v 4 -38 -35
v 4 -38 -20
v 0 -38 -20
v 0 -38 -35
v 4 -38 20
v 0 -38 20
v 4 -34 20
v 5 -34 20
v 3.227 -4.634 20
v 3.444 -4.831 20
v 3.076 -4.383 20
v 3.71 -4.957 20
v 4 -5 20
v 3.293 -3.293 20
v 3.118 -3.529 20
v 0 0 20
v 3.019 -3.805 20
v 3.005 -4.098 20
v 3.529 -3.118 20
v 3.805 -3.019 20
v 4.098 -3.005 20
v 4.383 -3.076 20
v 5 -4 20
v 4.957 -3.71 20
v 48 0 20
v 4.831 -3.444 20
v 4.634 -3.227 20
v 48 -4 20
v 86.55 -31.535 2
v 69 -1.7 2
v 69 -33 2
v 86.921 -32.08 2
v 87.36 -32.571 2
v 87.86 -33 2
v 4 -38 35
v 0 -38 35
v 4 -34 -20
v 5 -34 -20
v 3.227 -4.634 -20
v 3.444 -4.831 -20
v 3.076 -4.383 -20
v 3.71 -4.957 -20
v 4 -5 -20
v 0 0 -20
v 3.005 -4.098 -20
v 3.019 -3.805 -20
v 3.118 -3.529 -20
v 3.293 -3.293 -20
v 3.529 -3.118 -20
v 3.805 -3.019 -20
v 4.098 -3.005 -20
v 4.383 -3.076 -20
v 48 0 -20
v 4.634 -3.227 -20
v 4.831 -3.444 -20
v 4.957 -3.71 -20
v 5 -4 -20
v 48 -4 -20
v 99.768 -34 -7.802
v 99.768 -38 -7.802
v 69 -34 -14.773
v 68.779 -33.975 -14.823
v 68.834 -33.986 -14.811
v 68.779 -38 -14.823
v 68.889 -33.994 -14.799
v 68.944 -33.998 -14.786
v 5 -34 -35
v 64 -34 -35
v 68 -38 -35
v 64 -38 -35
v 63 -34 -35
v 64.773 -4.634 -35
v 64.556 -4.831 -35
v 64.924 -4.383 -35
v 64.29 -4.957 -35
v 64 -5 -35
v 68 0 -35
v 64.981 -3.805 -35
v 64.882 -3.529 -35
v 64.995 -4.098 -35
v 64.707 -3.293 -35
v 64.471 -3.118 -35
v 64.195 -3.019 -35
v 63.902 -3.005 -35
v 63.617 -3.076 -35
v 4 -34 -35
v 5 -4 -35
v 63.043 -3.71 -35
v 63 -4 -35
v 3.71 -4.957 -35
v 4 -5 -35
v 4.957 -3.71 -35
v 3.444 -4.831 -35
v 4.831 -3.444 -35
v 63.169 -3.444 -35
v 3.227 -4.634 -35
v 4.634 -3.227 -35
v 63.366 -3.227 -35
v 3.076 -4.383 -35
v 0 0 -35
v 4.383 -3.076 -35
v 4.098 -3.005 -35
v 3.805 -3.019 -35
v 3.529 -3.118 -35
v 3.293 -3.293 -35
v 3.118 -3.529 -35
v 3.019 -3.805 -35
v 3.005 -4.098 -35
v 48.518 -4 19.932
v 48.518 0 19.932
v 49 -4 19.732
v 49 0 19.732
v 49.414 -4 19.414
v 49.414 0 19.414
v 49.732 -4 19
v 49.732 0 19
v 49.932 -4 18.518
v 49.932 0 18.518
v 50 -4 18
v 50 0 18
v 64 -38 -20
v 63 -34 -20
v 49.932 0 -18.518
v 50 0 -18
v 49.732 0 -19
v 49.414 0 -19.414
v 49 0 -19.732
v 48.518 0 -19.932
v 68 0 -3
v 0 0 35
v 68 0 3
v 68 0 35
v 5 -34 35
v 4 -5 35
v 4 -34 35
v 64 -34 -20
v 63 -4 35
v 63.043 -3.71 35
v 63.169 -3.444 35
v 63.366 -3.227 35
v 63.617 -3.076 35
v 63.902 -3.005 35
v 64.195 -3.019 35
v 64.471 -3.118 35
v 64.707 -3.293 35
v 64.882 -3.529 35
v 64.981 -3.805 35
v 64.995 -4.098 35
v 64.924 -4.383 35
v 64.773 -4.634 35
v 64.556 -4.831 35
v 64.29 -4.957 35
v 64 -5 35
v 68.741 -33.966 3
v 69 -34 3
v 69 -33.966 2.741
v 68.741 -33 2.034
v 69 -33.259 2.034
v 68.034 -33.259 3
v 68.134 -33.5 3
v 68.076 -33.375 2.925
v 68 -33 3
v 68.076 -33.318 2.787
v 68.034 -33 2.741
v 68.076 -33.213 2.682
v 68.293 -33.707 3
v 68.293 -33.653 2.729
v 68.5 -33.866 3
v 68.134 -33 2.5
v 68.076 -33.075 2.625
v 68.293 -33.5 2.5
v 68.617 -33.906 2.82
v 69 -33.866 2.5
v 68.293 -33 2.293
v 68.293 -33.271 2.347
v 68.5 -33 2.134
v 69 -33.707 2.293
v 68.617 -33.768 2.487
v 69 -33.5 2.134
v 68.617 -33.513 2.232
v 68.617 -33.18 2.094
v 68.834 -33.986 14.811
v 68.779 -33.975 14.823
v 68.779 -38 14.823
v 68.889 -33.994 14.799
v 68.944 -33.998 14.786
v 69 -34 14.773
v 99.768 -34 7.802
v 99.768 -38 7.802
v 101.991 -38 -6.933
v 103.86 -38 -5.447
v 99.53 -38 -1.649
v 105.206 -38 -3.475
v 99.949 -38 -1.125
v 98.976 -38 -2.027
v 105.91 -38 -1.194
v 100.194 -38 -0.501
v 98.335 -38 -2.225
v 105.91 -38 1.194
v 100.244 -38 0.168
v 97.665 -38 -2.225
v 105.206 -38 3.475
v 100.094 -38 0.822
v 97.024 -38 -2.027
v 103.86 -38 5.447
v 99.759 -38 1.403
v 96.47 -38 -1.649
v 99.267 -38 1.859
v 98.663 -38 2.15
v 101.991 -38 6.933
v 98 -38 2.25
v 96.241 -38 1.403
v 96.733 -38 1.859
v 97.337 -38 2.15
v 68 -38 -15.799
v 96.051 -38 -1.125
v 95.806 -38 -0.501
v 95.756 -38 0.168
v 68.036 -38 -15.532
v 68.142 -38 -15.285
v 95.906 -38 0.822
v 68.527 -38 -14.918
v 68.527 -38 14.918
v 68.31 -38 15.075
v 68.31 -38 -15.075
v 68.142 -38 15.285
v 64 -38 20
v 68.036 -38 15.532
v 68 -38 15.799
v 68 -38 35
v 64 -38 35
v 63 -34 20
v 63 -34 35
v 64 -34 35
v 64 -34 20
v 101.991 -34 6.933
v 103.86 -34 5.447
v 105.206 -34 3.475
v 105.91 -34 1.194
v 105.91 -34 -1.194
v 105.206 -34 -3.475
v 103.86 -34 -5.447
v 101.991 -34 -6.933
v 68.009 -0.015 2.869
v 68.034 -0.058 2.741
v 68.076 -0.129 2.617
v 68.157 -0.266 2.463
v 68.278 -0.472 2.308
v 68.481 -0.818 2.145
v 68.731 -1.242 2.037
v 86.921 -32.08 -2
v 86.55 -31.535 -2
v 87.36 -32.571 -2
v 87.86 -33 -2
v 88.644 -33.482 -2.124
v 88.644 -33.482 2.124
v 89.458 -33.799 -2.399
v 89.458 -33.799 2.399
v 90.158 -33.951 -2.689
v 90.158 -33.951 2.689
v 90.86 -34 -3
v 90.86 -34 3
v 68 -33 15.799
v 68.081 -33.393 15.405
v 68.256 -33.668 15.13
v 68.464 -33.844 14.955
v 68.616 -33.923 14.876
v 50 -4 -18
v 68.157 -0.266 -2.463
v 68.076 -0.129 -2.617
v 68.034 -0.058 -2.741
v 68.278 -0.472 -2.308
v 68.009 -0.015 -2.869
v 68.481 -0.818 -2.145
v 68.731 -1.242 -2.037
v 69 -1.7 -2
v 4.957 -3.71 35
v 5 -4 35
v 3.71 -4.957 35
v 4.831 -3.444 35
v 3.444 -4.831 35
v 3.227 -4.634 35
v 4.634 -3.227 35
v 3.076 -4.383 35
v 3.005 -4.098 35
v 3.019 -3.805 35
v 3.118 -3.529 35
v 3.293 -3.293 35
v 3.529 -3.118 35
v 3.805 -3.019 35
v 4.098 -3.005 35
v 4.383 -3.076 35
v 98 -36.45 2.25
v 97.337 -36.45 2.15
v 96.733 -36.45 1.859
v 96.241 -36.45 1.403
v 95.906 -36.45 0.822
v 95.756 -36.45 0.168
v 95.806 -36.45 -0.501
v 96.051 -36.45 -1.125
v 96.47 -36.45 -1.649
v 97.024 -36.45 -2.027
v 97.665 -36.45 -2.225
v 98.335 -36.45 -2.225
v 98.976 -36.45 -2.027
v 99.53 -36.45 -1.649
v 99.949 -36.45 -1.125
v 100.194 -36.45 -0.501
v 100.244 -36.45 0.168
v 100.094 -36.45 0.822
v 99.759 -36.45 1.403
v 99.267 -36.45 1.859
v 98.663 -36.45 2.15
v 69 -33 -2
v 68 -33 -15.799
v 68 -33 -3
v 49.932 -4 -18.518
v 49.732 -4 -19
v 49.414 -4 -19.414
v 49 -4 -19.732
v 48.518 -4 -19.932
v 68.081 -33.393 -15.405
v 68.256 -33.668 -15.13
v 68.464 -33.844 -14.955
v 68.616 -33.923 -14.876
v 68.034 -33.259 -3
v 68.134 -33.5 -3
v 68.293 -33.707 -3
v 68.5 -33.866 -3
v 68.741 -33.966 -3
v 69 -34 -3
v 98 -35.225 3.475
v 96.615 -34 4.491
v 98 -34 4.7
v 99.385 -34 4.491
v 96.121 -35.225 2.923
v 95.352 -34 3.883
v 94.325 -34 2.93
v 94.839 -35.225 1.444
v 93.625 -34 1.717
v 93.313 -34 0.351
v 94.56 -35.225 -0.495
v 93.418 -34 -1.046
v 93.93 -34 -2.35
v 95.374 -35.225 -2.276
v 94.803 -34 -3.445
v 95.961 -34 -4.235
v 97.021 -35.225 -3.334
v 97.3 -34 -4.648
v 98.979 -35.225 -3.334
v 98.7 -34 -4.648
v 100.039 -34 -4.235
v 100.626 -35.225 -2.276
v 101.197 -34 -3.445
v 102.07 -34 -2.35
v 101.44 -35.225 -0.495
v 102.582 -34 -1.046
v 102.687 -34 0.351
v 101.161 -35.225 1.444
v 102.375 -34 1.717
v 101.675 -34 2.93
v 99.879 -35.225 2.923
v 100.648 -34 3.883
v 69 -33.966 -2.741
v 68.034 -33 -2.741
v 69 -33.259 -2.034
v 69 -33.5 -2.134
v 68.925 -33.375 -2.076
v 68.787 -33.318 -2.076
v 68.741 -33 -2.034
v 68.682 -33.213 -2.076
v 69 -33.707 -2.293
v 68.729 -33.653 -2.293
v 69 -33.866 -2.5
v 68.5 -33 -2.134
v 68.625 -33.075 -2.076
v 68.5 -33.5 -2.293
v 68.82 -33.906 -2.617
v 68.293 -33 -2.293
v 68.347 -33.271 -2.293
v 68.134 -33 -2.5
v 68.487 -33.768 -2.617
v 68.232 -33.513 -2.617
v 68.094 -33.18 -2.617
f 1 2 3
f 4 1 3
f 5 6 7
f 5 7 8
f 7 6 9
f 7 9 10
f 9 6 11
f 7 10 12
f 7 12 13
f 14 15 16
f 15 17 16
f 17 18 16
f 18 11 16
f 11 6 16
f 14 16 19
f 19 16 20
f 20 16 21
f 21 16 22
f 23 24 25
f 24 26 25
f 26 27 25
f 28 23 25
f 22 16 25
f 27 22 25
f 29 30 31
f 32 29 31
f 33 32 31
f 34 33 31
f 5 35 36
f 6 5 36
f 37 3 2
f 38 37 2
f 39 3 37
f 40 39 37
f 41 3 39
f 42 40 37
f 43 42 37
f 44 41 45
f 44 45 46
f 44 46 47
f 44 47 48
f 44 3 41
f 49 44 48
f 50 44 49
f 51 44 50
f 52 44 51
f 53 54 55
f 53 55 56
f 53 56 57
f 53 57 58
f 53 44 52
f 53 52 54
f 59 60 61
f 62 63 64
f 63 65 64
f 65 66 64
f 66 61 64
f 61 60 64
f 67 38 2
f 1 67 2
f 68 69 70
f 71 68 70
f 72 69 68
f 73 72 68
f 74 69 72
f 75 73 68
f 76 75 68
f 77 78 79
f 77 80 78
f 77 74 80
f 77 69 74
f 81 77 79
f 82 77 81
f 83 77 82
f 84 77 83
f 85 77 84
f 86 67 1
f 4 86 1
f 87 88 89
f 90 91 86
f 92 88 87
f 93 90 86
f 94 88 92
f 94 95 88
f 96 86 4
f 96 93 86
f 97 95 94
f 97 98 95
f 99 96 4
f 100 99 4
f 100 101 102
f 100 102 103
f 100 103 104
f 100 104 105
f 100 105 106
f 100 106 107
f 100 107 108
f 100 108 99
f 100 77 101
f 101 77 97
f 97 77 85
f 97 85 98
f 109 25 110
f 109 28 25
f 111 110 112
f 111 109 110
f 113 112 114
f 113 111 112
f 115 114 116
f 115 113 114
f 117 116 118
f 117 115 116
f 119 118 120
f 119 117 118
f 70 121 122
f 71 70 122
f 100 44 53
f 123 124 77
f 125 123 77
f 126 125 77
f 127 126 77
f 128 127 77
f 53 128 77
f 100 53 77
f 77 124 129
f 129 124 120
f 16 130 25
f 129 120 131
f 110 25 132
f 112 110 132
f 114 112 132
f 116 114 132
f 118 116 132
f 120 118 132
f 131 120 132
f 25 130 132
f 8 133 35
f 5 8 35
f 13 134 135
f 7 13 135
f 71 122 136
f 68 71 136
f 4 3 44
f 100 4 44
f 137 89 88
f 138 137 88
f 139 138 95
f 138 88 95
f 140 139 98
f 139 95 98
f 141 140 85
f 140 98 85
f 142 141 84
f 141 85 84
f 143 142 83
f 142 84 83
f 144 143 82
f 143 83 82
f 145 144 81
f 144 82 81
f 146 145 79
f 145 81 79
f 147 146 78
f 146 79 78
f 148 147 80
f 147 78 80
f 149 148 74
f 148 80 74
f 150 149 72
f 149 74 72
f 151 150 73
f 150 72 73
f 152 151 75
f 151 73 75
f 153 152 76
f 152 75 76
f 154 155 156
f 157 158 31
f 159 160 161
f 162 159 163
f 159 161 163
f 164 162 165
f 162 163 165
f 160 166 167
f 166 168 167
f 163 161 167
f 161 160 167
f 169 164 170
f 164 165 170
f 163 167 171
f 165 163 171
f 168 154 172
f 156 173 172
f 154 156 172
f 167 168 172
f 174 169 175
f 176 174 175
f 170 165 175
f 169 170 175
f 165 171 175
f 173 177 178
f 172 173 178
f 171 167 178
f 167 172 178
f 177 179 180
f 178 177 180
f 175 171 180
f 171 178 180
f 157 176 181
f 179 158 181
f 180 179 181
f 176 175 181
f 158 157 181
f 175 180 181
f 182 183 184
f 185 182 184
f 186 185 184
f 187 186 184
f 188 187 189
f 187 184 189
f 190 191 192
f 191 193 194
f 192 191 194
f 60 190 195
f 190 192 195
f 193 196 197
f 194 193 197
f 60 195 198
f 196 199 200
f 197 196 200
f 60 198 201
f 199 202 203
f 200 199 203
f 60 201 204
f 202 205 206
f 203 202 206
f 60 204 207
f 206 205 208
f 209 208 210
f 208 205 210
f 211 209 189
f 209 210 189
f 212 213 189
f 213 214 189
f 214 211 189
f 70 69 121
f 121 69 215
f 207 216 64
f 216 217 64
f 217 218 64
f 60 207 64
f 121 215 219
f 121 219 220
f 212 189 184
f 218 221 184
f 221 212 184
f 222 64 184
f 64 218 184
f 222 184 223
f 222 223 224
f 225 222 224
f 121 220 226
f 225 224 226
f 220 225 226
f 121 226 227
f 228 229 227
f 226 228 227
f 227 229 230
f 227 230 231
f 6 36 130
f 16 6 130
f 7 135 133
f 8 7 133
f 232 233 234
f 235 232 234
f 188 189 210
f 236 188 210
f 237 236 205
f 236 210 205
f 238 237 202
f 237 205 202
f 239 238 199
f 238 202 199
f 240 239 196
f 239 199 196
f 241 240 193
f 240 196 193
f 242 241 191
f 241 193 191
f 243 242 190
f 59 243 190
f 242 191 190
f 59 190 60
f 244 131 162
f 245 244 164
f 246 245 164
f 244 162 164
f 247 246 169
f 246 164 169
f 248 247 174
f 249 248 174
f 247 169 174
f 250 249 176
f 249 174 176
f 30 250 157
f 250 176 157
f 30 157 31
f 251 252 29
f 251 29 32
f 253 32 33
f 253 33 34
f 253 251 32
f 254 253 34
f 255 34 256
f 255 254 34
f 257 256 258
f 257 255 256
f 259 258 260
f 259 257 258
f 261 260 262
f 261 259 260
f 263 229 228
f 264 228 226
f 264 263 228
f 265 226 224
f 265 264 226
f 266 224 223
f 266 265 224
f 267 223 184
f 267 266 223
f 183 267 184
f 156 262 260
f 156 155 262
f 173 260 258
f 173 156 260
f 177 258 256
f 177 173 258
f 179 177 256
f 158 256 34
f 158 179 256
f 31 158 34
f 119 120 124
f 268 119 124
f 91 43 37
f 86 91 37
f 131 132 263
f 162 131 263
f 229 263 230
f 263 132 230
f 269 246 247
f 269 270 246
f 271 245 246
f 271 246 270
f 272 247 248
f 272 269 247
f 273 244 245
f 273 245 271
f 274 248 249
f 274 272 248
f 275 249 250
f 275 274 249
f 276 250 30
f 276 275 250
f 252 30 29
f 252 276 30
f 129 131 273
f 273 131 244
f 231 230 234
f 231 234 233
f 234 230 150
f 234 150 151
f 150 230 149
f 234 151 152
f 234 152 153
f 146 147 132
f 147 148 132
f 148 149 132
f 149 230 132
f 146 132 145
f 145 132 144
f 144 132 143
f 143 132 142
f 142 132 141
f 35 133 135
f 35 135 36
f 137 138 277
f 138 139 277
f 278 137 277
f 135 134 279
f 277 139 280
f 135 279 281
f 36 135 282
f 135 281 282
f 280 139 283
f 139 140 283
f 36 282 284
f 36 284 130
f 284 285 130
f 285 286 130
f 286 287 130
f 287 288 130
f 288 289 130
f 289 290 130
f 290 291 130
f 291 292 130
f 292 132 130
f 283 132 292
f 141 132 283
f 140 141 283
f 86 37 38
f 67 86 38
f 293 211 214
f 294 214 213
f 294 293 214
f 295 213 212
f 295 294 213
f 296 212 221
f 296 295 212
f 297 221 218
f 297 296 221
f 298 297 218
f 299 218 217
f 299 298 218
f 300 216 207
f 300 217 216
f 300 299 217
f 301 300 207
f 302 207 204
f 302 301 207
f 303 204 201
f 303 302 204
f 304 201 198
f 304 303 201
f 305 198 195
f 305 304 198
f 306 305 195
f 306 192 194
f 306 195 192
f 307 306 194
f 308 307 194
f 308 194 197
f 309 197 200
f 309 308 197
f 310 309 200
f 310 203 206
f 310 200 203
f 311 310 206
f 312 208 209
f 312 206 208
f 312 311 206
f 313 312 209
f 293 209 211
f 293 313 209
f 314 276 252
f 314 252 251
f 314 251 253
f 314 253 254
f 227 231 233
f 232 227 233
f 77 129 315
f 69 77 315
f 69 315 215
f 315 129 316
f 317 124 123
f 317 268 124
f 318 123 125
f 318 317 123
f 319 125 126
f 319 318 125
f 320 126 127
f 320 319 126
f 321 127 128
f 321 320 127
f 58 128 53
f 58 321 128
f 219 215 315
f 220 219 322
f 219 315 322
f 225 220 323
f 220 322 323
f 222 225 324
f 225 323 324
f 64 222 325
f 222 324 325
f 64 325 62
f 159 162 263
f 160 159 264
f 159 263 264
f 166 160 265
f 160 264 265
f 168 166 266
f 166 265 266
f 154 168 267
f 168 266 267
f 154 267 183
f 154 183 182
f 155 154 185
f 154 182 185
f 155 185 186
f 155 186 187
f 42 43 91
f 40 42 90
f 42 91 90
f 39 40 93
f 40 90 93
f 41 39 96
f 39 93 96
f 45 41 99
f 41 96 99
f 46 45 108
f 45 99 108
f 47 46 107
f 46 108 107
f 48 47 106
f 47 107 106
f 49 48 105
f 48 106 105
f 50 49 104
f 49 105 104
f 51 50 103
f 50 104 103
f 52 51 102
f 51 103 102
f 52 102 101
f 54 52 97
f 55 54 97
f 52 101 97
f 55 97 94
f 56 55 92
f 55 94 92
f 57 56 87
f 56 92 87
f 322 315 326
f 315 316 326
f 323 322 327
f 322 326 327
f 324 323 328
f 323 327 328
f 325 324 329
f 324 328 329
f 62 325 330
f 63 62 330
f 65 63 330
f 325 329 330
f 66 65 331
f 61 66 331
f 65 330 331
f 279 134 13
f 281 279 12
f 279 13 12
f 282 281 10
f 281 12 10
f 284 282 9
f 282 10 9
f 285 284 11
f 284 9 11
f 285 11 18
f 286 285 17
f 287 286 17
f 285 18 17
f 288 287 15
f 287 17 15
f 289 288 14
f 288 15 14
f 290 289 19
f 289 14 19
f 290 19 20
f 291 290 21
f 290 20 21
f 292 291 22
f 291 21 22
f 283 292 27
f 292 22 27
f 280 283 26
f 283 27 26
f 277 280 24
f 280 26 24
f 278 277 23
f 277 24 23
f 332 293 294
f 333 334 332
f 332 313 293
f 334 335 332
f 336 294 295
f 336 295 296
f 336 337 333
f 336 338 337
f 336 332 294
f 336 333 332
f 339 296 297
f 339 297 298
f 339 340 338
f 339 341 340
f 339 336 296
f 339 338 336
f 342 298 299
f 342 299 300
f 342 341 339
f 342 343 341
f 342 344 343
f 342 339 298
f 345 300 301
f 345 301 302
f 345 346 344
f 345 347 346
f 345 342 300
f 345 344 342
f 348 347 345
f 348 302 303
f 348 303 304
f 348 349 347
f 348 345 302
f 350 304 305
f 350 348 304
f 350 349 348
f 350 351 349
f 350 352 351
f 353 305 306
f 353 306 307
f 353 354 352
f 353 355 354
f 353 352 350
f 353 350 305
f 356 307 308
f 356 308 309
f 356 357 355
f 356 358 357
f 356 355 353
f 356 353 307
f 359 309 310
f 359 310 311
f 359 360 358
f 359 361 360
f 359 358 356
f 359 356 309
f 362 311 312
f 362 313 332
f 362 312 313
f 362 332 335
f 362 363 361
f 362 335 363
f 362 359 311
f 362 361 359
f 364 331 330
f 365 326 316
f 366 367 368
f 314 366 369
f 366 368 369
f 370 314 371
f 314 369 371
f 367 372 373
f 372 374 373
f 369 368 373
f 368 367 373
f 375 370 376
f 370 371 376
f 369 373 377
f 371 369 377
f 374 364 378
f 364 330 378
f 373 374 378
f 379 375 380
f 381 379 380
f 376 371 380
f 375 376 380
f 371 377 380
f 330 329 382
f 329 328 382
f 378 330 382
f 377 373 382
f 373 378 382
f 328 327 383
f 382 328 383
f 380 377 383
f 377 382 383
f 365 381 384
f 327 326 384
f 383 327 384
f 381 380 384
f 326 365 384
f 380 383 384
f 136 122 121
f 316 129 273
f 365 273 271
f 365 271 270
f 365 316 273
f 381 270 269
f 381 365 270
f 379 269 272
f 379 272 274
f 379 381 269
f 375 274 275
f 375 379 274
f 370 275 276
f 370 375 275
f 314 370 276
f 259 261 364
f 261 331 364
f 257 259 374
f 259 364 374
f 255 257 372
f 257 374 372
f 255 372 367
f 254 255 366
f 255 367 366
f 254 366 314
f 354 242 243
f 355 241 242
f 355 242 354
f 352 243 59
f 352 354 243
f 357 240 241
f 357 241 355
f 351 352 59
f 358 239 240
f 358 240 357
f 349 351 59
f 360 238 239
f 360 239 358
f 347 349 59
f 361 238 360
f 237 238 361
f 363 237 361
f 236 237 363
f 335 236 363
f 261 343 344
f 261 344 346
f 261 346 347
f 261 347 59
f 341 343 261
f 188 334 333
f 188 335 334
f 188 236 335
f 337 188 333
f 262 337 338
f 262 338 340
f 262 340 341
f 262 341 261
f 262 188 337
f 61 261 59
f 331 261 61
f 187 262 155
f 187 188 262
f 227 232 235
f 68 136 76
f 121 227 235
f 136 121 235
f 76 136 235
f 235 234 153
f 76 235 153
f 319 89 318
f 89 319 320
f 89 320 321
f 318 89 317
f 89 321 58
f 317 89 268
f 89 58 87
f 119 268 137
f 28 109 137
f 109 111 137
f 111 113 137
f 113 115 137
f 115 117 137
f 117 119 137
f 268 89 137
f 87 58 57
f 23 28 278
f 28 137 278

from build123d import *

# Parameters (mm, degrees)
FORME_PRINCIPALE_DEPTH  = 35
ESQUISSE3_W             = 50
ESQUISSE3_H             = 40
VIDEMENT_DEPTH          = 86.399063227
BOSSAGE_CROU_DEPTH      = 4
NERVURE3_REACH          = 119.919
ESQUISSE9_WALL_W        = 277.285093932
ESQUISSE9_WALL_H        = 4
CONG_2_R                = 1
CONG_3_R                = 5
CONG_4_R                = 2
ESQUISSE10_R            = 1
ENL_V_MAT_EXTRU_1_DEPTH = 133.589592352
ESQUISSE11_W            = 1
ESQUISSE11_H            = 40
ENL_V_MAT_EXTRU_2_DEPTH = 117.691902033


with BuildPart() as part:
    # Esquisse1 → Forme principale (new, symmetric)
    with BuildSketch(Plane.XY):
        Polygon((0, -38), (0, 0), (68, 0), (68, -38), (64, -38), (63, -34), (64, -34), (64, -4), (4, -4), (4, -34), (5, -34), (4, -38), align=None)
    extrude(amount=FORME_PRINCIPALE_DEPTH, both=True)

    # Esquisse3 → videment (cut, through all)
    with BuildSketch(Plane(origin=(0, 0, 0), x_dir=(1, 0, 0), z_dir=(0, 1, 0))):
        with Locations((25, 0)):
            Rectangle(ESQUISSE3_W, ESQUISSE3_H)
    extrude(amount=-VIDEMENT_DEPTH, mode=Mode.SUBTRACT)

    # Esquisse4 → Bossage écrou (add)
    with BuildSketch(Plane.XZ.offset(38)):
        with BuildLine():
            Line((68, 15), (99.767786128, 7.802238923))
            ThreePointArc((99.767786128, 7.802238923), (106, 0), (99.767786128, -7.802238923))
            Line((99.767786128, -7.802238923), (68, -15))
            Line((68, -15), (68, 15))
        make_face()
    extrude(amount=-BOSSAGE_CROU_DEPTH)

    # Esquisse7 → Fraisage pour vis à tête fraisée M41 (revolve, cut)
    with BuildSketch(Plane(origin=(98, -34, 0), x_dir=(0, 0, 1), z_dir=(1, 0, 0))):
        Polygon((0, 0), (0, 4.00005), (2.25, 4.00005), (2.25, 2.45), (4.7, 0), align=None)
    revolve(axis=Axis((98, -27.65, 0), (0, -1, 0)), mode=Mode.SUBTRACT)

    # Esquisse9 wall → Nervure3 (add, up to next)
    with BuildSketch(Plane(origin=(78, -17, 0), x_dir=(0.507020126563, -0.861934215158, 0), z_dir=(0.861934215158, 0.507020126563, 0)), mode=Mode.PRIVATE) as nervure3_sk1:
        Rectangle(ESQUISSE9_WALL_W, ESQUISSE9_WALL_H)
    nervure3_tool1 = extrude(nervure3_sk1.sketch, amount=-NERVURE3_REACH, mode=Mode.PRIVATE) - part.part
    add(nervure3_tool1.solids().sort_by_distance((78, -17, 0))[0])

    # Congé2
    cong_2_edges = [part.edges().sort_by_distance(p)[0] for p in [
        (68, -34, -8.5),
        (78, -34, -2),
        (68, -17, -2),
        (78, -34, 2),
        (68, -34, 8.5),
        (68, -17, 2),
        (68, -36, -15),
        (68, -36, 15),
    ]]
    fillet(cong_2_edges, radius=CONG_2_R)

    # Congé3
    cong_3_edges = [part.edges().sort_by_distance(p)[0] for p in [
        (88, -34, 0),
    ]]
    fillet(cong_3_edges, radius=CONG_3_R)

    # Congé4
    cong_4_edges = [part.edges().sort_by_distance(p)[0] for p in [
        (50, -2, -20),
        (50, -2, 20),
    ]]
    fillet(cong_4_edges, radius=CONG_4_R)

    # Esquisse10 → Enlèv. mat.-Extru.1 (cut, through all)
    with BuildSketch(Plane(origin=(0, 0, -35), x_dir=(-1, 0, 0), z_dir=(0, 0, -1))):
        with Locations((-64, -4)):
            Circle(ESQUISSE10_R)
        with Locations((-4, -4)):
            Circle(ESQUISSE10_R)
    extrude(amount=-ENL_V_MAT_EXTRU_1_DEPTH, mode=Mode.SUBTRACT)

    # Esquisse11 → Enlèv. mat.-Extru.2 (cut, through all)
    with BuildSketch(Plane(origin=(0, -34, 0), x_dir=(1, 0, 0), z_dir=(0, 1, 0))):
        with Locations((63.5, 0)):
            Rectangle(ESQUISSE11_W, ESQUISSE11_H)
    extrude(amount=-ENL_V_MAT_EXTRU_2_DEPTH, mode=Mode.SUBTRACT)


solid = part.part
